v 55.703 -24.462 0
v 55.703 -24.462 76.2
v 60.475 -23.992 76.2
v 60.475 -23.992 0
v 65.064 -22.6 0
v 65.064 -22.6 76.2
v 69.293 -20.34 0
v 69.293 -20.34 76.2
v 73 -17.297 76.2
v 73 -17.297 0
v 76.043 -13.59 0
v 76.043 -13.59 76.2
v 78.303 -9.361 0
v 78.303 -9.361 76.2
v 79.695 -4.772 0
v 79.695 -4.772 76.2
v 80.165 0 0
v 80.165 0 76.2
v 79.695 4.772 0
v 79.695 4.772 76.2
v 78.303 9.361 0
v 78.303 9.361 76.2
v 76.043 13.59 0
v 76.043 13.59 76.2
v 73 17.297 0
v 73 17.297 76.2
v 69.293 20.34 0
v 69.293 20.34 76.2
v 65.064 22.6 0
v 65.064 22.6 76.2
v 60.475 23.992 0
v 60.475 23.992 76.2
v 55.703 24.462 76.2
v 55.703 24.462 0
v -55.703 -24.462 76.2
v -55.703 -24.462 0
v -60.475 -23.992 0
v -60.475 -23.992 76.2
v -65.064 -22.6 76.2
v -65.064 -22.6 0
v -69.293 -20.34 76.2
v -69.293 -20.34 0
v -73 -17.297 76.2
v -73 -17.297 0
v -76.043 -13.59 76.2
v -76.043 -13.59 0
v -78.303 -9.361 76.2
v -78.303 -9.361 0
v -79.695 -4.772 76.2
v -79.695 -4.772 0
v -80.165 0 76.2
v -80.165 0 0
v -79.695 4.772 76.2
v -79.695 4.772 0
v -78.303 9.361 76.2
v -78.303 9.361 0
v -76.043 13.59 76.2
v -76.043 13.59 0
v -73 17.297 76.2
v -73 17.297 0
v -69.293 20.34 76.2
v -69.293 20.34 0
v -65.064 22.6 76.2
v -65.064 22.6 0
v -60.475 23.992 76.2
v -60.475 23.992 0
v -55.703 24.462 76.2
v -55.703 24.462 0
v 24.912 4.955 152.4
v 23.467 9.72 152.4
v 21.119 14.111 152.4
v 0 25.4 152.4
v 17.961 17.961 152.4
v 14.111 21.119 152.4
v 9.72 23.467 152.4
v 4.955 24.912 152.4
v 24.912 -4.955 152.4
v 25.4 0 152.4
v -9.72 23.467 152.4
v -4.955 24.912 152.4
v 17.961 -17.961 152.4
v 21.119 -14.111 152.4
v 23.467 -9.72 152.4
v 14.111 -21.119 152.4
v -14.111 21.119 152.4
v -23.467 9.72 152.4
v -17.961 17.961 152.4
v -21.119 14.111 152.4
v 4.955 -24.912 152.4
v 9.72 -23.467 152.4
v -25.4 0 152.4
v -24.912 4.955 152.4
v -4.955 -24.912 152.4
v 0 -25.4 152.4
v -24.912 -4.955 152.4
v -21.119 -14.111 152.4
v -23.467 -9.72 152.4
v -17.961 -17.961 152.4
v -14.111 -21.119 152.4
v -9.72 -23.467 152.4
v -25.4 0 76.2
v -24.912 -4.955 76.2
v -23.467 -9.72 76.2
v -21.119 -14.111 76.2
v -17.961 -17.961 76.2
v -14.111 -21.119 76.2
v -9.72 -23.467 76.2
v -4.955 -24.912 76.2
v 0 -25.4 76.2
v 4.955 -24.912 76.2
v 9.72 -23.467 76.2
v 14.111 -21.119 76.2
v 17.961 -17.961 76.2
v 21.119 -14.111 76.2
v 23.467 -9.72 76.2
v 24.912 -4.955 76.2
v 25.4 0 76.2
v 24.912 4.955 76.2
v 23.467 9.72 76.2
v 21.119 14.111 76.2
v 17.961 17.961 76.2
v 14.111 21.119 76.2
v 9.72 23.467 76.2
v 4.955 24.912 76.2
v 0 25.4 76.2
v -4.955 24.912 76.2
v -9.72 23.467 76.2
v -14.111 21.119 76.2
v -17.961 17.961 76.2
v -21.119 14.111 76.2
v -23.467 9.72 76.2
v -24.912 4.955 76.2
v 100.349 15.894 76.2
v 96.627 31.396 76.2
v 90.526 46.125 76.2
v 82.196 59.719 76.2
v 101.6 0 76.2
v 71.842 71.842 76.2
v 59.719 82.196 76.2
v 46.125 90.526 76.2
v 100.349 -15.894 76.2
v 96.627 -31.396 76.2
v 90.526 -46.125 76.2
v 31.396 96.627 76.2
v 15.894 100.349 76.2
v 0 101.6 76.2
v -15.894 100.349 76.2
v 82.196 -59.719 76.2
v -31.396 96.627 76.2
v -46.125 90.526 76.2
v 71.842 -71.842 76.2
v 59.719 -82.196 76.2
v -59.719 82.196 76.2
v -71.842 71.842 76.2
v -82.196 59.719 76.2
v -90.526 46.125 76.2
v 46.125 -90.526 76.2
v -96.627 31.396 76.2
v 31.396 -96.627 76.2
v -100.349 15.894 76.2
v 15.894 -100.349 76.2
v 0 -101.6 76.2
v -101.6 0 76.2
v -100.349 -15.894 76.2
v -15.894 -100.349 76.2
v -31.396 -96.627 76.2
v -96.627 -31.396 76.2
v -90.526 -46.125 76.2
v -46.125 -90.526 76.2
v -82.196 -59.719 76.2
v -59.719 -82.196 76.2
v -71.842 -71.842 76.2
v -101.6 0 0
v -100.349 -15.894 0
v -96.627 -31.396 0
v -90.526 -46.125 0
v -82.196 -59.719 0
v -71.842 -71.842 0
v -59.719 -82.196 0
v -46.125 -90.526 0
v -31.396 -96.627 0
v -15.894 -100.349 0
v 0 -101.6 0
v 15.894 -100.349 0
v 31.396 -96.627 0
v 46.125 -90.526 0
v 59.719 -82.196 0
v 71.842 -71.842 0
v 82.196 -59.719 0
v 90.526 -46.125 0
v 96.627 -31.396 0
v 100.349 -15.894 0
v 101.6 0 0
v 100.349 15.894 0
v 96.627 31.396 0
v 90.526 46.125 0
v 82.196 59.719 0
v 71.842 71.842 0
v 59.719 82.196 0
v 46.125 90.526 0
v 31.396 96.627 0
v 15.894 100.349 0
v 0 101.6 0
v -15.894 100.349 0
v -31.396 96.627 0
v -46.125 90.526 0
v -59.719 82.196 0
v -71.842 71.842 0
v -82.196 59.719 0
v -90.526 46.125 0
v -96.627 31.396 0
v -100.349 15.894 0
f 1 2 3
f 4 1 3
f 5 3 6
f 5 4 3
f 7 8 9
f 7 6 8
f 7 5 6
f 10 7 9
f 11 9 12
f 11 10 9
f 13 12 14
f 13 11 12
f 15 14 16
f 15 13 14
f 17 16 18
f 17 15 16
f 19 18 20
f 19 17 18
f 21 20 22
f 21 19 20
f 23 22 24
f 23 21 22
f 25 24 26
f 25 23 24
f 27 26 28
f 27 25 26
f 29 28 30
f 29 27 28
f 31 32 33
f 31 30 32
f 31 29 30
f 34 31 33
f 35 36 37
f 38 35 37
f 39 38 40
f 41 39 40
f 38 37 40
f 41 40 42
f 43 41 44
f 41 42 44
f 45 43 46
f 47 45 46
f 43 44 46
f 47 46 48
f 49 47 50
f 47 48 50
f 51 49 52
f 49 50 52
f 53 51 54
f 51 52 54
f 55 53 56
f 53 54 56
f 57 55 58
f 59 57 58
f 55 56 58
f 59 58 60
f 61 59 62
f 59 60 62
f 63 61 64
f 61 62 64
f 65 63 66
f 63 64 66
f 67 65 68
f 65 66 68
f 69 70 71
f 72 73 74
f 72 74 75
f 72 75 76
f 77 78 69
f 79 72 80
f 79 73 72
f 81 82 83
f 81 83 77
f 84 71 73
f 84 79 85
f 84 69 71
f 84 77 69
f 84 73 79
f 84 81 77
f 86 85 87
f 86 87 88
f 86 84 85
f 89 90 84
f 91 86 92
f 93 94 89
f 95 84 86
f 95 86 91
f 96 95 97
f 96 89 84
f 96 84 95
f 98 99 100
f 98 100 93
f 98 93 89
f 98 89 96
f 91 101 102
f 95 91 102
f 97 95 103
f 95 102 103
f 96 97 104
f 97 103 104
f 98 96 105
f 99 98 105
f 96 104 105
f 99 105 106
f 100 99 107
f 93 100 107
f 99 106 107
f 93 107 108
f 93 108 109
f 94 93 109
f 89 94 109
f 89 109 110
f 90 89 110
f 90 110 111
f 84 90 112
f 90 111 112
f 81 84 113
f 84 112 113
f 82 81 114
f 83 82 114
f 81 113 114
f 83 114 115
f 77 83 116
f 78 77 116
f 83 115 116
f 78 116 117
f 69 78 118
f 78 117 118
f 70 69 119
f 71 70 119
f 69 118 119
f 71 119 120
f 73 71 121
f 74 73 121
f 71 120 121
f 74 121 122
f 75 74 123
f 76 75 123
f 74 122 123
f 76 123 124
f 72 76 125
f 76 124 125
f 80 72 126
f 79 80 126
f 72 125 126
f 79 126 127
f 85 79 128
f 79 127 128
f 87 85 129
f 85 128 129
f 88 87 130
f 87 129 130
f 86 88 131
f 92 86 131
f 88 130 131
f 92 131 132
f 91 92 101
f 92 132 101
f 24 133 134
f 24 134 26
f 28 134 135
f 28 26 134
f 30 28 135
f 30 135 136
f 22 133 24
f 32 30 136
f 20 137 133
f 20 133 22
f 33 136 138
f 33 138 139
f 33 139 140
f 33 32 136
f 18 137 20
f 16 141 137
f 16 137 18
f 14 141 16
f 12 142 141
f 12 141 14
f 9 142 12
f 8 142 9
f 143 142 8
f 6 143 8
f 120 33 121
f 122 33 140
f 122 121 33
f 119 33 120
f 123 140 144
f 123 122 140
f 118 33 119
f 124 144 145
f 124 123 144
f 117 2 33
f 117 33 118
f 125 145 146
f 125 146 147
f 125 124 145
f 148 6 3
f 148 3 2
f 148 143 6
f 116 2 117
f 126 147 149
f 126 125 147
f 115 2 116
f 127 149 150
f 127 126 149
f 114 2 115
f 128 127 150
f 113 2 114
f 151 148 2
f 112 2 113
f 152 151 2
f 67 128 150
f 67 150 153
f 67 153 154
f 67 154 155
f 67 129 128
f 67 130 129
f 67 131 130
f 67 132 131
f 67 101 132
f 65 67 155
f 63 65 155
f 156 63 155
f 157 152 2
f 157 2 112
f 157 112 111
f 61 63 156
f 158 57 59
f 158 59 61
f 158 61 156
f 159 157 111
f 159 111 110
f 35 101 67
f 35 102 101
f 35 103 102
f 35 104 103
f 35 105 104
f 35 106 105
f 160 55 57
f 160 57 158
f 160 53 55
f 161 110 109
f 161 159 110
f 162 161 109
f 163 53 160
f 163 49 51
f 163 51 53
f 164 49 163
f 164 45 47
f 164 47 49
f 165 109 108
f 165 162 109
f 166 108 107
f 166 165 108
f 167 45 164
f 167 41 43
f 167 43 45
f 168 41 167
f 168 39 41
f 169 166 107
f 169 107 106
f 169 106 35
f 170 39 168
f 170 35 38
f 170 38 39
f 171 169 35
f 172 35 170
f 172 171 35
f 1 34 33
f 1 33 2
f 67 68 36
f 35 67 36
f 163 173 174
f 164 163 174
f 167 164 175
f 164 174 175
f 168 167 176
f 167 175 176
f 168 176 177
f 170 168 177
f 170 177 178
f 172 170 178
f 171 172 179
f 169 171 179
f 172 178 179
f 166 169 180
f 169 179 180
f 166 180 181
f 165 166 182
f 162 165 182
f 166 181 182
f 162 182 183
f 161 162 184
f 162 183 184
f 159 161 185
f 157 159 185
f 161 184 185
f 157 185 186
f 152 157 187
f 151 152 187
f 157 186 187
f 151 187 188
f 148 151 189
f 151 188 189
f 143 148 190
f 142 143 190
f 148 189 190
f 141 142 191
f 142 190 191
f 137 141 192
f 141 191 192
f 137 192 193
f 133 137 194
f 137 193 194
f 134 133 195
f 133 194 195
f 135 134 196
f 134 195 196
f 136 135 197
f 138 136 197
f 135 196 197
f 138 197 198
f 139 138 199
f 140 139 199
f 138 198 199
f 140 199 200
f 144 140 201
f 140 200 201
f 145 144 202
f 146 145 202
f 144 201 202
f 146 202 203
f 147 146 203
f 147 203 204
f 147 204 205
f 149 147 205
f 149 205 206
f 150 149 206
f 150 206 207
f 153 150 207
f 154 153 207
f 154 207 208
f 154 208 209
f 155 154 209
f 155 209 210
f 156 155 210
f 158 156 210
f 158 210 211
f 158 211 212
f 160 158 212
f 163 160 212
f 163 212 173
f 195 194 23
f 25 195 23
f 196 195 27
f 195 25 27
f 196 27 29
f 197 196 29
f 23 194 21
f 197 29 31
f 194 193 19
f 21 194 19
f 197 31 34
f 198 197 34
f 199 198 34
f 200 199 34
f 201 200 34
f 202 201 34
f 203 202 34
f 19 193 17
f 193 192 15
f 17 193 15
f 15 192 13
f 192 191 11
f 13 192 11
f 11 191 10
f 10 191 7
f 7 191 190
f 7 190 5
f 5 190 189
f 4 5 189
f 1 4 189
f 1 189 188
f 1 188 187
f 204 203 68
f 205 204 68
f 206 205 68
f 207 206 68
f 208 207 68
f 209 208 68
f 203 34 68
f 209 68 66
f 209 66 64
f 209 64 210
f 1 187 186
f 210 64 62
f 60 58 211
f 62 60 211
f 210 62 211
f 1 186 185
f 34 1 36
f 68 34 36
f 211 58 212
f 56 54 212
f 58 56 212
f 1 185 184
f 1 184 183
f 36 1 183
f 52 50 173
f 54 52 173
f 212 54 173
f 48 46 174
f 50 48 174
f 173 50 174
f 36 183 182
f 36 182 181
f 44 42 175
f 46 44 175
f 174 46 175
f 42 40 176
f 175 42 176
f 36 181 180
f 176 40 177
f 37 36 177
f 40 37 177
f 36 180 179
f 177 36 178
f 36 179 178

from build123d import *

# Parameters (mm, degrees)
SKETCH1_R               = 101.6
BOSS_EXTRUDE1_DEPTH     = 76.2
CUT_EXTRUDE7_DEPTH      = 163.639355631
CUT_EXTRUDE7_DEPTH_BACK = 163.639355631
SKETCH3_R               = 25.4
BOSS_EXTRUDE2_DEPTH     = 76.2


with BuildPart() as part:
    # Sketch1 → Boss-Extrude1 (new body)
    with BuildSketch(Plane.XY):
        with Locations(Location((0, 0, 0), (0, 0, 180))):
            Circle(SKETCH1_R)
    extrude(amount=BOSS_EXTRUDE1_DEPTH)

    # Sketch2 → Cut-Extrude7 (cut, two sides: drawn at the far end of the back side and taken through both)
    with BuildSketch(Plane.XY.offset(76.2).offset(-CUT_EXTRUDE7_DEPTH_BACK)):
        with BuildLine():
            ThreePointArc((-55.703026842, -24.462175809), (-80.165202651, 0), (-55.703026842, 24.462175809))
            Line((-55.703026842, 24.462175809), (-55.703026842, -24.462175809))
        make_face()
        with BuildLine():
            Line((55.703026842, 24.462175809), (55.703026842, -24.462175809))
            ThreePointArc((55.703026842, -24.462175809), (80.165202651, 0), (55.703026842, 24.462175809))
        make_face()
    extrude(amount=CUT_EXTRUDE7_DEPTH + CUT_EXTRUDE7_DEPTH_BACK, mode=Mode.SUBTRACT)

    # Sketch3 → Boss-Extrude2 (add)
    with BuildSketch(Plane.XY.offset(76.2)):
        with Locations(Location((0, 0, 0), (0, 0, 180))):
            Circle(SKETCH3_R)
    extrude(amount=BOSS_EXTRUDE2_DEPTH)


solid = part.part
